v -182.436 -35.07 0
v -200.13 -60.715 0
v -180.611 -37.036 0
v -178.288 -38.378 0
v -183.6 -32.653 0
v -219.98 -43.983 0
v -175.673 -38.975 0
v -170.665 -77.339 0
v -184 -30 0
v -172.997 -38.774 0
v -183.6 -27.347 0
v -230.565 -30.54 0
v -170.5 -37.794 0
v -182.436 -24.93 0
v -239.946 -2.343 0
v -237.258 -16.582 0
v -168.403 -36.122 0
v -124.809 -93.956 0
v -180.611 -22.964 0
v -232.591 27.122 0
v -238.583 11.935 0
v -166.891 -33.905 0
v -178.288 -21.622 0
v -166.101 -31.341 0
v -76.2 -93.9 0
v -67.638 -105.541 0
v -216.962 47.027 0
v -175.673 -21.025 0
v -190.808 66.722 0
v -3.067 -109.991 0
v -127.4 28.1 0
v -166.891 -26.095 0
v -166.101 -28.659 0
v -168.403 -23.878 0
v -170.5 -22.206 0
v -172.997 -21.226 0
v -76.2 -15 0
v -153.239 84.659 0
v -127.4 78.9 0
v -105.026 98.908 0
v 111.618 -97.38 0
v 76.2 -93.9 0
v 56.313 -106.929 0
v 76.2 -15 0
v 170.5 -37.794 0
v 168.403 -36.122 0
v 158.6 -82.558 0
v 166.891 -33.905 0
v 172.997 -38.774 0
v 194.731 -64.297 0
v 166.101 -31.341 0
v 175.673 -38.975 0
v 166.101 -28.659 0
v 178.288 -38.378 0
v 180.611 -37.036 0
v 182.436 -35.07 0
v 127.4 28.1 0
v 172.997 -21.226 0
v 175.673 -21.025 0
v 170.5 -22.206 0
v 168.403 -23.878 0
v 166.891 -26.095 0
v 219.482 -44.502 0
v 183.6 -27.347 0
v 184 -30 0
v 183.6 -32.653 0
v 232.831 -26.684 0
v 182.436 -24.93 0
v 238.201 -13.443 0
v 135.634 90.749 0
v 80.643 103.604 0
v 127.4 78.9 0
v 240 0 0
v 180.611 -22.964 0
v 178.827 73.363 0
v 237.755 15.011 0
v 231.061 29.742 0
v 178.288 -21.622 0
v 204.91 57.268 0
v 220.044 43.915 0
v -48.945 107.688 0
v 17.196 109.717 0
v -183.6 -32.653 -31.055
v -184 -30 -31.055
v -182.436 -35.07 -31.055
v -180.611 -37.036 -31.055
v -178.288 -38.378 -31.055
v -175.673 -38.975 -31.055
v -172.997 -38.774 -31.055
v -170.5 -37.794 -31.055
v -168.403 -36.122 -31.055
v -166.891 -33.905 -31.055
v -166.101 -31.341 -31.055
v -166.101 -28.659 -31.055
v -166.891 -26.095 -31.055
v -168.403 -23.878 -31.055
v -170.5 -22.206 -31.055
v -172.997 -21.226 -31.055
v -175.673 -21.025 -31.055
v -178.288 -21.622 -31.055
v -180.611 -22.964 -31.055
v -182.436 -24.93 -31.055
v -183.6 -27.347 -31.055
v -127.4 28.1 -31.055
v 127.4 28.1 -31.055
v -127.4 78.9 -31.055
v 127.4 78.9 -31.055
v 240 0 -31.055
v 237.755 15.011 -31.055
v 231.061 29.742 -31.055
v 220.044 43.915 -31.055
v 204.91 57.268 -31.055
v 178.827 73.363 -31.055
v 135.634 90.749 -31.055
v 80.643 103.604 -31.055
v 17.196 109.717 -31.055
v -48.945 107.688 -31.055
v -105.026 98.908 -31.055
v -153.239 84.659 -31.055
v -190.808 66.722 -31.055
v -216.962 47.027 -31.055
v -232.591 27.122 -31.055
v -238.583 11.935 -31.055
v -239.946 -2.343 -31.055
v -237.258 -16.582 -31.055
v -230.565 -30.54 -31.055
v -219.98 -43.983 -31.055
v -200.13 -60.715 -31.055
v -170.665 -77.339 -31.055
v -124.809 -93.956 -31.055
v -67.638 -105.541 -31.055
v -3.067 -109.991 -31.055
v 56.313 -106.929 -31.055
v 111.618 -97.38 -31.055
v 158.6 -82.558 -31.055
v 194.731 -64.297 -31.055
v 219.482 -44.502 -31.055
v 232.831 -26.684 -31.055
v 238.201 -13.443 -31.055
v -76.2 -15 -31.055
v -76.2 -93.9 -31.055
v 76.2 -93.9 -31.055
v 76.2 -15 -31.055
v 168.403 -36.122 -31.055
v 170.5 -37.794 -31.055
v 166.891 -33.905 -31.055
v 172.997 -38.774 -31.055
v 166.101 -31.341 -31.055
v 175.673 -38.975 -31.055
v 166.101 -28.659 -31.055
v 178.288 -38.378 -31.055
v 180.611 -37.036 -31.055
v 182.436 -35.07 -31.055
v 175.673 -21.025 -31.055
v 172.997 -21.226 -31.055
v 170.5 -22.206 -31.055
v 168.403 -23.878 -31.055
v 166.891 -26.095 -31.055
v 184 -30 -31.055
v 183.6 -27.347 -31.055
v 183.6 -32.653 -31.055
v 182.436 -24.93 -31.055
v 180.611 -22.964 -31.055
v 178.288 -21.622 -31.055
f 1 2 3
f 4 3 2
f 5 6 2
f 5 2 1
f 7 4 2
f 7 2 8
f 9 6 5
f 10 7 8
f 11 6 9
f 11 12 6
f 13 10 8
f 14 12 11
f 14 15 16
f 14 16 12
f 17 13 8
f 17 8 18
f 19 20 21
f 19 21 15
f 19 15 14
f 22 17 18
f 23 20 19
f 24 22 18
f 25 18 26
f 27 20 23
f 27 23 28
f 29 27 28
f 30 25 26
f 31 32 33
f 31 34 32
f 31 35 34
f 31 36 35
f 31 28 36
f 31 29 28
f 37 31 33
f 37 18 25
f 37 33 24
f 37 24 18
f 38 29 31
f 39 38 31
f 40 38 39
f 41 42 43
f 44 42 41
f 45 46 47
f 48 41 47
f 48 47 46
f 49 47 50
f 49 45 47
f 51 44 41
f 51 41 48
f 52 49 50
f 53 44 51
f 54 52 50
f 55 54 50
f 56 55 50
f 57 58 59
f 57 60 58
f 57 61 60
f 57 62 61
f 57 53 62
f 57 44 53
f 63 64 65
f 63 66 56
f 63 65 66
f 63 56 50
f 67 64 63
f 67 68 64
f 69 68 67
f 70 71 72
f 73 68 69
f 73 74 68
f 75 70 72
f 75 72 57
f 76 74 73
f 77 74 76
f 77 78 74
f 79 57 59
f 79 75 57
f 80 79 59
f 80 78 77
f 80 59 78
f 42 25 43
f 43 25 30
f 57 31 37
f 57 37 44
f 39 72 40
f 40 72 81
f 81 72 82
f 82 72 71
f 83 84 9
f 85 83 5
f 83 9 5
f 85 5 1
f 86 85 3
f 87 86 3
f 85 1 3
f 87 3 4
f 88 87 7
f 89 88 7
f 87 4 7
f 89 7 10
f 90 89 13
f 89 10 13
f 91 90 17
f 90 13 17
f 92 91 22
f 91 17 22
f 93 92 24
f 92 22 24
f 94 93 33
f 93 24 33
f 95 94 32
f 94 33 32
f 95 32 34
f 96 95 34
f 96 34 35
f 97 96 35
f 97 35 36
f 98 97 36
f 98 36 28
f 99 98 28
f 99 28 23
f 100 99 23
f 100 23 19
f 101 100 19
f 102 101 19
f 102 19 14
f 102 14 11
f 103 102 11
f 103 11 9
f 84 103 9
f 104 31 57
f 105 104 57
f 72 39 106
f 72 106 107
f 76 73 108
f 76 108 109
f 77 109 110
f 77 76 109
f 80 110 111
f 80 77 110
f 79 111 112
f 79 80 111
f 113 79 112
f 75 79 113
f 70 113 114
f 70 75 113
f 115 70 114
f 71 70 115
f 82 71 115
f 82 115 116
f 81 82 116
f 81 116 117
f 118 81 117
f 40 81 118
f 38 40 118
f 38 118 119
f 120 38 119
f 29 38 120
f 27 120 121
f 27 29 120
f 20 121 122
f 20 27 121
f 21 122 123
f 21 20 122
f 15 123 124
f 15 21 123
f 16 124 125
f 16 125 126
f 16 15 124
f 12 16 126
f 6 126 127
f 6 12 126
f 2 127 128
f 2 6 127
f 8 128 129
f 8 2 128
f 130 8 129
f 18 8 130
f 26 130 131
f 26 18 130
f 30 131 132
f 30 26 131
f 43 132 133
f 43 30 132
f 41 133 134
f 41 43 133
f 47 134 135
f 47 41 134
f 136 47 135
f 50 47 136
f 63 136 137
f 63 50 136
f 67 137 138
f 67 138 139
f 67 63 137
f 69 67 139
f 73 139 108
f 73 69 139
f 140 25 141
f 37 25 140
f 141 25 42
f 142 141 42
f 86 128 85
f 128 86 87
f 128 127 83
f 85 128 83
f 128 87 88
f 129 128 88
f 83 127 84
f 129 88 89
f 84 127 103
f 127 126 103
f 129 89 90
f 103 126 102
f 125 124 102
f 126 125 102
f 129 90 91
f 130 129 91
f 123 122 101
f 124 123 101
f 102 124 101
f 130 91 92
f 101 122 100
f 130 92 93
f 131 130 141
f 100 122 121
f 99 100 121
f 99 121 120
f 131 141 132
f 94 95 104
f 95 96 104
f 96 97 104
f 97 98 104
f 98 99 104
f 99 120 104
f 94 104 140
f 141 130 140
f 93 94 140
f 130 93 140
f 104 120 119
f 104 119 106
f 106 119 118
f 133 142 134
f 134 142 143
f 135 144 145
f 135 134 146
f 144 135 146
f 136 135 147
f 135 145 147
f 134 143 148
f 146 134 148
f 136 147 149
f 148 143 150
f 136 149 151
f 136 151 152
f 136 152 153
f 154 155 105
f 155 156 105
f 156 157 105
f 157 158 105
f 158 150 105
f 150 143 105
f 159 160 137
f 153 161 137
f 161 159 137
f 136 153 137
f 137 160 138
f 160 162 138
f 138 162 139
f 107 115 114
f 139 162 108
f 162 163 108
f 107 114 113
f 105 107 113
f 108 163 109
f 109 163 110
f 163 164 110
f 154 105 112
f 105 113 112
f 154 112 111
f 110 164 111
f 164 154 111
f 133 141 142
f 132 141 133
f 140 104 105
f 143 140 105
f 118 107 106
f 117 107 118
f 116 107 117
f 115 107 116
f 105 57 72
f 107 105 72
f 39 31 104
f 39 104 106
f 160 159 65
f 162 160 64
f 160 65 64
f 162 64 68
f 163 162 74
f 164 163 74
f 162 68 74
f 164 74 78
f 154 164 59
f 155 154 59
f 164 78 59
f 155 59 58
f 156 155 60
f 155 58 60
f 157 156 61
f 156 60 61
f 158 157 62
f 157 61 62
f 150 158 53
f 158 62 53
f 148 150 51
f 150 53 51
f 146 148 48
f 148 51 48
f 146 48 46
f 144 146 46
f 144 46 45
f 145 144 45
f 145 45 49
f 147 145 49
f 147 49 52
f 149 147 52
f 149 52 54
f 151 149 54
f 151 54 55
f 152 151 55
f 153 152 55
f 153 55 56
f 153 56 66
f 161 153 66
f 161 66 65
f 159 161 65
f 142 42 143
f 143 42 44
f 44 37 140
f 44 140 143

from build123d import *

# Parameters (mm, degrees)
SKETCH1_RX          = 240
SKETCH1_RY          = 110
BOSS_EXTRUDE1_DEPTH = 31.055
SKETCH10_W          = 254.8
SKETCH10_H          = 50.8
CUT_EXTRUDE5_DEPTH  = 266.827788286
SKETCH13_W          = 152.4
SKETCH13_H          = 78.9
CUT_EXTRUDE7_DEPTH  = 266.827788286
SKETCH12_R          = 9
CUT_EXTRUDE8_DEPTH  = 266.827788286


with BuildPart() as part:
    # Sketch1 → Boss-Extrude1 (new body)
    with BuildSketch(Plane.XY):
        with Locations((0, 0)):
            Ellipse(SKETCH1_RX, SKETCH1_RY)
    extrude(amount=-BOSS_EXTRUDE1_DEPTH)

    # Sketch10 → Cut-Extrude5 (cut, through all)
    with BuildSketch(Plane.XY):
        with Locations((0, 53.5)):
            Rectangle(SKETCH10_W, SKETCH10_H)
    extrude(amount=-CUT_EXTRUDE5_DEPTH, mode=Mode.SUBTRACT)

    # Sketch13 → Cut-Extrude7 (cut, through all)
    with BuildSketch(Plane.XY):
        with Locations((0, -54.45)):
            Rectangle(SKETCH13_W, SKETCH13_H)
    extrude(amount=-CUT_EXTRUDE7_DEPTH, mode=Mode.SUBTRACT)

    # Sketch12 → Cut-Extrude8 (cut, through all)
    with BuildSketch(Plane.XY):
        with Locations((175, -30)):
            Circle(SKETCH12_R)
        with Locations(Location((-175, -30, 0), (0, 0, 180))):
            Circle(SKETCH12_R)
    extrude(amount=-CUT_EXTRUDE8_DEPTH, mode=Mode.SUBTRACT)


solid = part.part
